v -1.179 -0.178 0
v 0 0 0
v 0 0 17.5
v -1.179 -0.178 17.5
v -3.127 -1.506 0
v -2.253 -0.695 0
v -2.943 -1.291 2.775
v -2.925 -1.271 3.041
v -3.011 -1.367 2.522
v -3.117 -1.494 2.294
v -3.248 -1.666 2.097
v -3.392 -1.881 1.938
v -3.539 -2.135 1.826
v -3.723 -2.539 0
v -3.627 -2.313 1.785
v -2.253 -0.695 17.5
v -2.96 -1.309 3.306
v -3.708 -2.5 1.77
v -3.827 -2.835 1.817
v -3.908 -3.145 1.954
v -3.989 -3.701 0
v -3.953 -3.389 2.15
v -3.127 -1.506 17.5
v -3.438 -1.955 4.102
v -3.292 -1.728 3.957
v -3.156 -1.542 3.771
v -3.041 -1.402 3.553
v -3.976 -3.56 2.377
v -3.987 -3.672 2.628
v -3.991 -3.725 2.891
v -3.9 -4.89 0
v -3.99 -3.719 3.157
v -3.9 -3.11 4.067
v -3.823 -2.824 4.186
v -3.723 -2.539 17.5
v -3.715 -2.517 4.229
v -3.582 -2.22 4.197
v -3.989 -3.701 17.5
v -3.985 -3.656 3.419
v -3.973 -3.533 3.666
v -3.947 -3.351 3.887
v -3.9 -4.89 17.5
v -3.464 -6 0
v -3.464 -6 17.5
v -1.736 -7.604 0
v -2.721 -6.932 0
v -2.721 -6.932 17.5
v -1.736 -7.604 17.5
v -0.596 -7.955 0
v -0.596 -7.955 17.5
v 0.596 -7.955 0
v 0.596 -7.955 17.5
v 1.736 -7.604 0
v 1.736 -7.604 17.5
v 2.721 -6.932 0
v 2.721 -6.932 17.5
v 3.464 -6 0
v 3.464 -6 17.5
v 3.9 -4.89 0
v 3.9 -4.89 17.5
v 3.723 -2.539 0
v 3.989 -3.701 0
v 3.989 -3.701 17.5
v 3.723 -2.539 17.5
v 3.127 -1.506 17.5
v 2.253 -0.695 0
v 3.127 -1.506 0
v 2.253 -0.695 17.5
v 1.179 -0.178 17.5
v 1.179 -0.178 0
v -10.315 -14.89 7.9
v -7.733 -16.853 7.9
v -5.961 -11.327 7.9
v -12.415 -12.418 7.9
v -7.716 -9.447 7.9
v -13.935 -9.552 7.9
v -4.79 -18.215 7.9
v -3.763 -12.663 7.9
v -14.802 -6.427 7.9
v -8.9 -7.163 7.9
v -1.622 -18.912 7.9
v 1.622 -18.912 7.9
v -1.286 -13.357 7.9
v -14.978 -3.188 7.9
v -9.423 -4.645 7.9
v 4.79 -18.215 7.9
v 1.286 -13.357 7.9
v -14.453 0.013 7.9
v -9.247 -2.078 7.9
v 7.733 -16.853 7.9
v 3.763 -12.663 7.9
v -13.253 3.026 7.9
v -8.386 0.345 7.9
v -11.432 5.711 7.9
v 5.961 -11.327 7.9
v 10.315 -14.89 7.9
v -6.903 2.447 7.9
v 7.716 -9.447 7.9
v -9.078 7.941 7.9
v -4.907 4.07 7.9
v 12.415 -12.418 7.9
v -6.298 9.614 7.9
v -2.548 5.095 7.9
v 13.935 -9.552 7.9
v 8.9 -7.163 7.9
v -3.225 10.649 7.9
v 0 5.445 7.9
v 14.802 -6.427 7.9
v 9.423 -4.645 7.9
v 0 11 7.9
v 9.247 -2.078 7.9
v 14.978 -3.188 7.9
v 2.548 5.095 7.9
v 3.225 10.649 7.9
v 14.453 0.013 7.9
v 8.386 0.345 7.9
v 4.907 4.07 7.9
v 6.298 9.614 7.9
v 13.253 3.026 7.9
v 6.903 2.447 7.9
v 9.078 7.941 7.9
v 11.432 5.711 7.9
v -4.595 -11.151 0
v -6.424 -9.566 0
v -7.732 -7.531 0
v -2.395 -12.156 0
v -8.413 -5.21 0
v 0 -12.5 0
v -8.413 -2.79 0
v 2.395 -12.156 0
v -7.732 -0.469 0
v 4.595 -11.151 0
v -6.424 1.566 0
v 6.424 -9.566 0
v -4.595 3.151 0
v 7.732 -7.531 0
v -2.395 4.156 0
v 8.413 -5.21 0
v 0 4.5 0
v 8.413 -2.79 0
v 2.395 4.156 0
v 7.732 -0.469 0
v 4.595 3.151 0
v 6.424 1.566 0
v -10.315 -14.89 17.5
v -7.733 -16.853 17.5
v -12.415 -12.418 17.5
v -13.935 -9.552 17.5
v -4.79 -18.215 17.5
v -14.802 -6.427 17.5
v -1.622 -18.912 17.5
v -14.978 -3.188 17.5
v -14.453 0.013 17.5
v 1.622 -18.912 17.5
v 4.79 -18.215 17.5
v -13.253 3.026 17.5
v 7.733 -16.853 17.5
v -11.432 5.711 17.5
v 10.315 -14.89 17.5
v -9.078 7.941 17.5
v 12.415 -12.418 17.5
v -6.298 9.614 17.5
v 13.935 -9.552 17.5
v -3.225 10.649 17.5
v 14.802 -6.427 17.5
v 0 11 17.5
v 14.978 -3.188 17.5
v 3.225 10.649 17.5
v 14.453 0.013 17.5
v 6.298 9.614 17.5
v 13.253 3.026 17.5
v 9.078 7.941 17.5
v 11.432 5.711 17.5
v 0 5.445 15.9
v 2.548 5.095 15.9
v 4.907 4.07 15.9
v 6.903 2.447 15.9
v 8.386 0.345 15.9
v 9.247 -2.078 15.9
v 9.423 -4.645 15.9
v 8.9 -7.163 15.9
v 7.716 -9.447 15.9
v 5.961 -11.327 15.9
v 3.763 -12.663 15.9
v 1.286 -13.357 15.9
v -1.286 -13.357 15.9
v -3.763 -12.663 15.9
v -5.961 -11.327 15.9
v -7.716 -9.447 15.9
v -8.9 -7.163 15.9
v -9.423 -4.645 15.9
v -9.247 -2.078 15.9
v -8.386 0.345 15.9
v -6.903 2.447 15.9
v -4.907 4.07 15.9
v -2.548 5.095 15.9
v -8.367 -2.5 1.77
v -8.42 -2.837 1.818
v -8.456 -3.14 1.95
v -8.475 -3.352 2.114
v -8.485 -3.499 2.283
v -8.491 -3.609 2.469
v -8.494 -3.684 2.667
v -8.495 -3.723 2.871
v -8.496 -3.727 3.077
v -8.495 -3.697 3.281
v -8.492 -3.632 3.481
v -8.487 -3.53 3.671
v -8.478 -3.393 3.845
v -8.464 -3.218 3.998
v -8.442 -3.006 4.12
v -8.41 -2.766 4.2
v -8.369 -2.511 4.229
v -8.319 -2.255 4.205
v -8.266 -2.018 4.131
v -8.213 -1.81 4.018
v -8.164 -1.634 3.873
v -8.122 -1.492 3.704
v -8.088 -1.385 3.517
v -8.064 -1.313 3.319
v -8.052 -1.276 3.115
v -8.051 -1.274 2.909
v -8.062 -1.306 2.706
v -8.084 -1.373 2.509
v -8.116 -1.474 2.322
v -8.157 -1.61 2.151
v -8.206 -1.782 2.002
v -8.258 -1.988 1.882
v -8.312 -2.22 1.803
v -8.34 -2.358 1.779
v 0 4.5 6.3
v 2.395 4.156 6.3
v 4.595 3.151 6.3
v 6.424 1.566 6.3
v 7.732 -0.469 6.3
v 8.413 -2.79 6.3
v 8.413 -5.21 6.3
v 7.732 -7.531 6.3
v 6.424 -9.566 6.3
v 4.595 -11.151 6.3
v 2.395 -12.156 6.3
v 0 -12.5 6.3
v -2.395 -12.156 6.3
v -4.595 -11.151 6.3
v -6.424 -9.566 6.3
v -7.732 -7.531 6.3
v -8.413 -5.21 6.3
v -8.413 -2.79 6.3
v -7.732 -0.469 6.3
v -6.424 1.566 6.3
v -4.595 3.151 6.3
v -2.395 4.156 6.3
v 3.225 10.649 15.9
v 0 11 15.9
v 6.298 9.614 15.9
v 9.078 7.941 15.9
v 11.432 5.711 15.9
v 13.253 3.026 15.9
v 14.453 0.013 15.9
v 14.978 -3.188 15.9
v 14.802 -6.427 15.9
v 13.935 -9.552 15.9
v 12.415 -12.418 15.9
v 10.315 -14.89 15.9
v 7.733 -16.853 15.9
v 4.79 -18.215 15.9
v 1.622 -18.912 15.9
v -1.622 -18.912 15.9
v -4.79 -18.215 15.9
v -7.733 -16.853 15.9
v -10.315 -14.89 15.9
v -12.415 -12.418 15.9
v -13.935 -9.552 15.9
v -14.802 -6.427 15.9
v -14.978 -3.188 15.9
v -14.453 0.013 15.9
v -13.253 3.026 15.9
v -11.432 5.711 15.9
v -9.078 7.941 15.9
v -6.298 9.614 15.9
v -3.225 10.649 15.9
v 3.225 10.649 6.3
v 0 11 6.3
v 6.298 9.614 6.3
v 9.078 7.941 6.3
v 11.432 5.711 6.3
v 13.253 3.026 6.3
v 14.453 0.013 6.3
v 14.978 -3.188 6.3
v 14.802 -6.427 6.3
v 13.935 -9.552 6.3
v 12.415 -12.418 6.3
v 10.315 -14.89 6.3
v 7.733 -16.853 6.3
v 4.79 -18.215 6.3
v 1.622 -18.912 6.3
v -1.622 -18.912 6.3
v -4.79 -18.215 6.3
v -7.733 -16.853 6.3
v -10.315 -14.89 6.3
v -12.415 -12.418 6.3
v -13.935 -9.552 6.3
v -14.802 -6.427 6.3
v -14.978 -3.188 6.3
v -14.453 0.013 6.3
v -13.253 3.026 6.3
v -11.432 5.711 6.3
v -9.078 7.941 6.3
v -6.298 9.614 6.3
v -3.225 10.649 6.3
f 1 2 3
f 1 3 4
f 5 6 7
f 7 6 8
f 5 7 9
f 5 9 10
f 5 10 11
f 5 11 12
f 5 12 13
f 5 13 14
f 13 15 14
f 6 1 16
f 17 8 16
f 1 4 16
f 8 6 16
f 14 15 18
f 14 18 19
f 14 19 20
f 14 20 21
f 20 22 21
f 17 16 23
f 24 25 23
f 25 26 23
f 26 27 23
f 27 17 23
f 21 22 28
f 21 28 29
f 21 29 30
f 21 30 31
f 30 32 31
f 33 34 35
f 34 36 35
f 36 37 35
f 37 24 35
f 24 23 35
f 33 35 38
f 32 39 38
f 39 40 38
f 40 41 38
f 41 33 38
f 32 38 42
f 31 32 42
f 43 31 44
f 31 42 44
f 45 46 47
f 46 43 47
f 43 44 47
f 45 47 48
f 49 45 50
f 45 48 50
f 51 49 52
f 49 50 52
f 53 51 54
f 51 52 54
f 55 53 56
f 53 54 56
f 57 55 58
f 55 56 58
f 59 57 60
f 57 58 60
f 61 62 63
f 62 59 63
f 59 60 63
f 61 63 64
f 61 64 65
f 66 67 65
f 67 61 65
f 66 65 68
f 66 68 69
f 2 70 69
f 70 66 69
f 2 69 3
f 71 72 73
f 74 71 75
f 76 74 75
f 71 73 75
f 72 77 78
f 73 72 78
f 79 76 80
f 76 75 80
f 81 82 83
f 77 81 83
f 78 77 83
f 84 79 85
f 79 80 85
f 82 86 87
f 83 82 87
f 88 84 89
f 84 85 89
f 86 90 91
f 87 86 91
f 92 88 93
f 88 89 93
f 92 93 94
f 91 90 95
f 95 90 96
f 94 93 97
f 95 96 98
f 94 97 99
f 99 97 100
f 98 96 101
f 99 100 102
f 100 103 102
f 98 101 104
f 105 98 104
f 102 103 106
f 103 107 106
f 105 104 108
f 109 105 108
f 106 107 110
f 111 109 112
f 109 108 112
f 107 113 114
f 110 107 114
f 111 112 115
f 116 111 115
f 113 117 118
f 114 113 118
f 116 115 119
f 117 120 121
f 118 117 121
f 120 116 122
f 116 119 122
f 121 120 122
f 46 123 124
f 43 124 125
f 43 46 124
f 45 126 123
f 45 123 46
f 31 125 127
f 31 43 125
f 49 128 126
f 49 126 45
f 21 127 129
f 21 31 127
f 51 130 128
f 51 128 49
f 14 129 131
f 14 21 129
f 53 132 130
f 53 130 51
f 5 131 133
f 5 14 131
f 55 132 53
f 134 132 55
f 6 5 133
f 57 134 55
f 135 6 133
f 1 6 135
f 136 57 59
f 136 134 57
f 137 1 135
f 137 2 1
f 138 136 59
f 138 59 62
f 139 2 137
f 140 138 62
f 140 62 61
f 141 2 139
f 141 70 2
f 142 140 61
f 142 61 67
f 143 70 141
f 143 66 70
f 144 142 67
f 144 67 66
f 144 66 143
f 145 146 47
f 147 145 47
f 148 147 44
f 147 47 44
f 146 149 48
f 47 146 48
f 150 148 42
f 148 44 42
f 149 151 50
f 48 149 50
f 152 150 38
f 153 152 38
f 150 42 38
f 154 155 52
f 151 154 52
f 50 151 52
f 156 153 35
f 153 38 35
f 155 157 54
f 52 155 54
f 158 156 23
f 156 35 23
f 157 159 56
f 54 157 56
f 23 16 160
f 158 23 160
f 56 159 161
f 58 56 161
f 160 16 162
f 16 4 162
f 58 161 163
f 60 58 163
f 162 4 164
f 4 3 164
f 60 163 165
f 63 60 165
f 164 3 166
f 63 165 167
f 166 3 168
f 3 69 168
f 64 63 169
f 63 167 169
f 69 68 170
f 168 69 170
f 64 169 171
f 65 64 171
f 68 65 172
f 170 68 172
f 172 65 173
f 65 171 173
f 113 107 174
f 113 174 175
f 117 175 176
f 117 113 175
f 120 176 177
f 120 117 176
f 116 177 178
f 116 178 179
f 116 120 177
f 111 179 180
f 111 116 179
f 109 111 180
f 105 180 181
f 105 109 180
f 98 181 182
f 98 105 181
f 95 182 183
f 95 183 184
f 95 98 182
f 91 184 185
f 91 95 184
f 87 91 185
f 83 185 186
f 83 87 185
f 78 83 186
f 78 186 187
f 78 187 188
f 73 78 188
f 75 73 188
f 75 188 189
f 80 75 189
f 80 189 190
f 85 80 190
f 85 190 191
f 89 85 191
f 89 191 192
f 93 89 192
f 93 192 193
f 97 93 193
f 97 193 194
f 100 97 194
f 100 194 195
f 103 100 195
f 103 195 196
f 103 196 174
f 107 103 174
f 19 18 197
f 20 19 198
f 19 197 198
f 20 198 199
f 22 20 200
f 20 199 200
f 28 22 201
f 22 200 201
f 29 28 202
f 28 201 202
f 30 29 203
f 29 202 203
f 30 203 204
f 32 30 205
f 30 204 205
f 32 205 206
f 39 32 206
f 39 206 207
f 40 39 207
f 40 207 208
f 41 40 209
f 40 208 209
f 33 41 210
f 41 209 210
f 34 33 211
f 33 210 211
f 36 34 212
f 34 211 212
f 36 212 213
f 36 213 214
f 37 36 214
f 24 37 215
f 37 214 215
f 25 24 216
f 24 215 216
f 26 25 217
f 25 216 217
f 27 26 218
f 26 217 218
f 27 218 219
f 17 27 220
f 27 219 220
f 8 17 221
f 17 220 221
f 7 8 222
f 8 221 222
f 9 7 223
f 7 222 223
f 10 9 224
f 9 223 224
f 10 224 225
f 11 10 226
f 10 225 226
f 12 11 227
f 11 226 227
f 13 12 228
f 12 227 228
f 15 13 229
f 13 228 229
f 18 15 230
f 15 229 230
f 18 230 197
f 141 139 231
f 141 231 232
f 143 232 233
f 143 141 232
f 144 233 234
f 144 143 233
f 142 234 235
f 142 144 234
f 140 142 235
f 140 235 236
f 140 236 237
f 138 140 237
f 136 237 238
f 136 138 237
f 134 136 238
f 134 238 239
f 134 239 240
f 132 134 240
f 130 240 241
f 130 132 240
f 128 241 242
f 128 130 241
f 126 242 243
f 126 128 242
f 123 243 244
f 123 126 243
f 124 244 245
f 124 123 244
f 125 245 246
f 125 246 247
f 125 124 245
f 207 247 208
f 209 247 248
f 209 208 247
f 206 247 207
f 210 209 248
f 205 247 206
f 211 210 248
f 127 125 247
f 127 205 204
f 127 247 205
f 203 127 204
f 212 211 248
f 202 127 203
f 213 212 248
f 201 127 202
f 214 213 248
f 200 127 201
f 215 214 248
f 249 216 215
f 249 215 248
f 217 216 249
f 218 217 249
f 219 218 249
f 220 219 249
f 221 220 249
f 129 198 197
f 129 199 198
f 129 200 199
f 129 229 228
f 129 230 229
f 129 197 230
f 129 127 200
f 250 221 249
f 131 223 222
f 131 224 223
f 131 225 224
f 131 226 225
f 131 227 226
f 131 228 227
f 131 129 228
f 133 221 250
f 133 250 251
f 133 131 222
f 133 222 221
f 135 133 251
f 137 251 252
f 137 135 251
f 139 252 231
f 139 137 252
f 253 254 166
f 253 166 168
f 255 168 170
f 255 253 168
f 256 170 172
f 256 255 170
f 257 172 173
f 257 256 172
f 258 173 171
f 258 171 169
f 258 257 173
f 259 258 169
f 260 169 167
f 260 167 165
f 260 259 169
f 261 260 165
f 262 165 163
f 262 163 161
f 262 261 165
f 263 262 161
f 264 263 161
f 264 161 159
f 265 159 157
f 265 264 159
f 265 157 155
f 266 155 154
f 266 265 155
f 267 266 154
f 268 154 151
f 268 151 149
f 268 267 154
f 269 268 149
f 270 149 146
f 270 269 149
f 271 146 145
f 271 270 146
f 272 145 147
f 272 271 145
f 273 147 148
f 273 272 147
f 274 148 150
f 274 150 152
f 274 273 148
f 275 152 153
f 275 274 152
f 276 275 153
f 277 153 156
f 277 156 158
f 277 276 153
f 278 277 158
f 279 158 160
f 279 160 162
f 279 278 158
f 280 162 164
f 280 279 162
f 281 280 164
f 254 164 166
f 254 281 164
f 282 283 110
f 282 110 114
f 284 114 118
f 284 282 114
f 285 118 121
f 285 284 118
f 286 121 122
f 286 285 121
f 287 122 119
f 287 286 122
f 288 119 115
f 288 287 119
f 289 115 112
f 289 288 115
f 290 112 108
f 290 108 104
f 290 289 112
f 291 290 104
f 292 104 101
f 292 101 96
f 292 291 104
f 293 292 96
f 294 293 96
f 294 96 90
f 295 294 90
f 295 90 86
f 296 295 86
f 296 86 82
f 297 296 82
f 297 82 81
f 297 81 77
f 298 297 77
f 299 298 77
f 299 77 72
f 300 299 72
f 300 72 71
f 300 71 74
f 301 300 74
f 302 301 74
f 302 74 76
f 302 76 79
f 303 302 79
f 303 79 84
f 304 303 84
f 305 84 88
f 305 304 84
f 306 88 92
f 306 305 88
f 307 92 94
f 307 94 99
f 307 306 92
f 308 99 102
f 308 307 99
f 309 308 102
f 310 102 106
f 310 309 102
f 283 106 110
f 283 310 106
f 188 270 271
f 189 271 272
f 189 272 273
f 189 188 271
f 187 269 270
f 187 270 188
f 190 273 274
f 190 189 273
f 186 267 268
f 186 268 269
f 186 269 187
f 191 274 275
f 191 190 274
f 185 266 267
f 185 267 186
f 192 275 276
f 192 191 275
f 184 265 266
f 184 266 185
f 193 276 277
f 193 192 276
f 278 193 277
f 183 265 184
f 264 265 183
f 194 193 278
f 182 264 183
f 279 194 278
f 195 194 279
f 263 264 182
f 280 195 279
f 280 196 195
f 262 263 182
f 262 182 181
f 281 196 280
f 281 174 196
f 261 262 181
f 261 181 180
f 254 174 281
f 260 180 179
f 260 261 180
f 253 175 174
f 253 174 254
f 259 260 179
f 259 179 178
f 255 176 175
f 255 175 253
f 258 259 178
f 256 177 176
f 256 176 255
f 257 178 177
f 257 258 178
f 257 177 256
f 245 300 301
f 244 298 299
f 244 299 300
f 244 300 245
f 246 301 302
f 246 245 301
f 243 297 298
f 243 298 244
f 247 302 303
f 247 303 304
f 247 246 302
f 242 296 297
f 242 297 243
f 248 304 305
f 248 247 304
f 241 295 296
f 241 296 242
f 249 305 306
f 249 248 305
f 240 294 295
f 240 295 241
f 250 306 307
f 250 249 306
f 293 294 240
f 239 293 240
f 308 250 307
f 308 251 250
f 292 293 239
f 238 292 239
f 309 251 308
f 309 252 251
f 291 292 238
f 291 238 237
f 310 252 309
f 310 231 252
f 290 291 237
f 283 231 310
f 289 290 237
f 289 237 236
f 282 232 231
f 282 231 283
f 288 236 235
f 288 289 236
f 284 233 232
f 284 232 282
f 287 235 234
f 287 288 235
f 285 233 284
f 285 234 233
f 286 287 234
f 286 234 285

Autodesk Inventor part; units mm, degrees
ref_plane "YZ Plane" through (0, 0, 0) normal (1, 0, 0) x (0, 1, 0)
ref_plane "XZ Plane" through (0, 0, 0) normal (0, 1, 0) x (-1, 0, 0)
ref_plane "XY Plane" through (0, 0, 0) normal (0, 0, 1) x (1, 0, 0)
sketch "Sketch1" plane through (0, 0, 0) normal (1, 0, 0) x (0, 1, 0)
  line L0 (0, 17.5) -> (11, 17.5)
  line L1 (11, 17.5) -> (11, 15.9)
  line L2 (11, 15.9) -> (5.445, 15.9)
  line L3 (5.445, 15.9) -> (5.445, 7.9)
  line L4 (5.445, 7.9) -> (11, 7.9)
  line L5 (11, 7.9) -> (11, 6.3)
  line L6 (11, 6.3) -> (4.5, 6.3)
  line L7 (4.5, 6.3) -> (4.5, 0)
  line L8 (4.5, 0) -> (0, 0)
  line L9 (0, 0) -> (0, 17.5)
  line L10 (-4, 10.0812) -> (-4, 1.7277) construction
  dimension "d0" = 30
  dimension "d1" = 17.5
  dimension "d2" = 8
  dimension "d3" = 11.2
  dimension "d4" = 8
  dimension "d5" = 17
  dimension "d6" = 18.89
revolve "Revolution1" add sketch "Sketch1" angle 360 about axis through (0, -4, 10.0812) along (0, 0, -1)
sketch "Sketch2" plane through (0, 0, 0) normal (1, 0, 0) x (0, 1, 0)
  line L0 (-12.5, 6.3) -> (-12.5, 0) construction
  line L1 (4.5, 6.3) -> (4.5, 0) construction
  line L2 (-12.5, 0) -> (4.5, 0) construction
  line L3 (-11.6, 0) -> (6.6, 0) construction
  point P0 (0, 0)
  point P1 (-2.5, 3)
  point P2 (-2.5, 3)
  dimension "d8" = 3
hole "Hole1" at (0, -2.5, 3) direction (-1, 0, 0) diameter 2.459 end through all thread size "M3x0.5" class "6H" standard "ISO Metric profile"
